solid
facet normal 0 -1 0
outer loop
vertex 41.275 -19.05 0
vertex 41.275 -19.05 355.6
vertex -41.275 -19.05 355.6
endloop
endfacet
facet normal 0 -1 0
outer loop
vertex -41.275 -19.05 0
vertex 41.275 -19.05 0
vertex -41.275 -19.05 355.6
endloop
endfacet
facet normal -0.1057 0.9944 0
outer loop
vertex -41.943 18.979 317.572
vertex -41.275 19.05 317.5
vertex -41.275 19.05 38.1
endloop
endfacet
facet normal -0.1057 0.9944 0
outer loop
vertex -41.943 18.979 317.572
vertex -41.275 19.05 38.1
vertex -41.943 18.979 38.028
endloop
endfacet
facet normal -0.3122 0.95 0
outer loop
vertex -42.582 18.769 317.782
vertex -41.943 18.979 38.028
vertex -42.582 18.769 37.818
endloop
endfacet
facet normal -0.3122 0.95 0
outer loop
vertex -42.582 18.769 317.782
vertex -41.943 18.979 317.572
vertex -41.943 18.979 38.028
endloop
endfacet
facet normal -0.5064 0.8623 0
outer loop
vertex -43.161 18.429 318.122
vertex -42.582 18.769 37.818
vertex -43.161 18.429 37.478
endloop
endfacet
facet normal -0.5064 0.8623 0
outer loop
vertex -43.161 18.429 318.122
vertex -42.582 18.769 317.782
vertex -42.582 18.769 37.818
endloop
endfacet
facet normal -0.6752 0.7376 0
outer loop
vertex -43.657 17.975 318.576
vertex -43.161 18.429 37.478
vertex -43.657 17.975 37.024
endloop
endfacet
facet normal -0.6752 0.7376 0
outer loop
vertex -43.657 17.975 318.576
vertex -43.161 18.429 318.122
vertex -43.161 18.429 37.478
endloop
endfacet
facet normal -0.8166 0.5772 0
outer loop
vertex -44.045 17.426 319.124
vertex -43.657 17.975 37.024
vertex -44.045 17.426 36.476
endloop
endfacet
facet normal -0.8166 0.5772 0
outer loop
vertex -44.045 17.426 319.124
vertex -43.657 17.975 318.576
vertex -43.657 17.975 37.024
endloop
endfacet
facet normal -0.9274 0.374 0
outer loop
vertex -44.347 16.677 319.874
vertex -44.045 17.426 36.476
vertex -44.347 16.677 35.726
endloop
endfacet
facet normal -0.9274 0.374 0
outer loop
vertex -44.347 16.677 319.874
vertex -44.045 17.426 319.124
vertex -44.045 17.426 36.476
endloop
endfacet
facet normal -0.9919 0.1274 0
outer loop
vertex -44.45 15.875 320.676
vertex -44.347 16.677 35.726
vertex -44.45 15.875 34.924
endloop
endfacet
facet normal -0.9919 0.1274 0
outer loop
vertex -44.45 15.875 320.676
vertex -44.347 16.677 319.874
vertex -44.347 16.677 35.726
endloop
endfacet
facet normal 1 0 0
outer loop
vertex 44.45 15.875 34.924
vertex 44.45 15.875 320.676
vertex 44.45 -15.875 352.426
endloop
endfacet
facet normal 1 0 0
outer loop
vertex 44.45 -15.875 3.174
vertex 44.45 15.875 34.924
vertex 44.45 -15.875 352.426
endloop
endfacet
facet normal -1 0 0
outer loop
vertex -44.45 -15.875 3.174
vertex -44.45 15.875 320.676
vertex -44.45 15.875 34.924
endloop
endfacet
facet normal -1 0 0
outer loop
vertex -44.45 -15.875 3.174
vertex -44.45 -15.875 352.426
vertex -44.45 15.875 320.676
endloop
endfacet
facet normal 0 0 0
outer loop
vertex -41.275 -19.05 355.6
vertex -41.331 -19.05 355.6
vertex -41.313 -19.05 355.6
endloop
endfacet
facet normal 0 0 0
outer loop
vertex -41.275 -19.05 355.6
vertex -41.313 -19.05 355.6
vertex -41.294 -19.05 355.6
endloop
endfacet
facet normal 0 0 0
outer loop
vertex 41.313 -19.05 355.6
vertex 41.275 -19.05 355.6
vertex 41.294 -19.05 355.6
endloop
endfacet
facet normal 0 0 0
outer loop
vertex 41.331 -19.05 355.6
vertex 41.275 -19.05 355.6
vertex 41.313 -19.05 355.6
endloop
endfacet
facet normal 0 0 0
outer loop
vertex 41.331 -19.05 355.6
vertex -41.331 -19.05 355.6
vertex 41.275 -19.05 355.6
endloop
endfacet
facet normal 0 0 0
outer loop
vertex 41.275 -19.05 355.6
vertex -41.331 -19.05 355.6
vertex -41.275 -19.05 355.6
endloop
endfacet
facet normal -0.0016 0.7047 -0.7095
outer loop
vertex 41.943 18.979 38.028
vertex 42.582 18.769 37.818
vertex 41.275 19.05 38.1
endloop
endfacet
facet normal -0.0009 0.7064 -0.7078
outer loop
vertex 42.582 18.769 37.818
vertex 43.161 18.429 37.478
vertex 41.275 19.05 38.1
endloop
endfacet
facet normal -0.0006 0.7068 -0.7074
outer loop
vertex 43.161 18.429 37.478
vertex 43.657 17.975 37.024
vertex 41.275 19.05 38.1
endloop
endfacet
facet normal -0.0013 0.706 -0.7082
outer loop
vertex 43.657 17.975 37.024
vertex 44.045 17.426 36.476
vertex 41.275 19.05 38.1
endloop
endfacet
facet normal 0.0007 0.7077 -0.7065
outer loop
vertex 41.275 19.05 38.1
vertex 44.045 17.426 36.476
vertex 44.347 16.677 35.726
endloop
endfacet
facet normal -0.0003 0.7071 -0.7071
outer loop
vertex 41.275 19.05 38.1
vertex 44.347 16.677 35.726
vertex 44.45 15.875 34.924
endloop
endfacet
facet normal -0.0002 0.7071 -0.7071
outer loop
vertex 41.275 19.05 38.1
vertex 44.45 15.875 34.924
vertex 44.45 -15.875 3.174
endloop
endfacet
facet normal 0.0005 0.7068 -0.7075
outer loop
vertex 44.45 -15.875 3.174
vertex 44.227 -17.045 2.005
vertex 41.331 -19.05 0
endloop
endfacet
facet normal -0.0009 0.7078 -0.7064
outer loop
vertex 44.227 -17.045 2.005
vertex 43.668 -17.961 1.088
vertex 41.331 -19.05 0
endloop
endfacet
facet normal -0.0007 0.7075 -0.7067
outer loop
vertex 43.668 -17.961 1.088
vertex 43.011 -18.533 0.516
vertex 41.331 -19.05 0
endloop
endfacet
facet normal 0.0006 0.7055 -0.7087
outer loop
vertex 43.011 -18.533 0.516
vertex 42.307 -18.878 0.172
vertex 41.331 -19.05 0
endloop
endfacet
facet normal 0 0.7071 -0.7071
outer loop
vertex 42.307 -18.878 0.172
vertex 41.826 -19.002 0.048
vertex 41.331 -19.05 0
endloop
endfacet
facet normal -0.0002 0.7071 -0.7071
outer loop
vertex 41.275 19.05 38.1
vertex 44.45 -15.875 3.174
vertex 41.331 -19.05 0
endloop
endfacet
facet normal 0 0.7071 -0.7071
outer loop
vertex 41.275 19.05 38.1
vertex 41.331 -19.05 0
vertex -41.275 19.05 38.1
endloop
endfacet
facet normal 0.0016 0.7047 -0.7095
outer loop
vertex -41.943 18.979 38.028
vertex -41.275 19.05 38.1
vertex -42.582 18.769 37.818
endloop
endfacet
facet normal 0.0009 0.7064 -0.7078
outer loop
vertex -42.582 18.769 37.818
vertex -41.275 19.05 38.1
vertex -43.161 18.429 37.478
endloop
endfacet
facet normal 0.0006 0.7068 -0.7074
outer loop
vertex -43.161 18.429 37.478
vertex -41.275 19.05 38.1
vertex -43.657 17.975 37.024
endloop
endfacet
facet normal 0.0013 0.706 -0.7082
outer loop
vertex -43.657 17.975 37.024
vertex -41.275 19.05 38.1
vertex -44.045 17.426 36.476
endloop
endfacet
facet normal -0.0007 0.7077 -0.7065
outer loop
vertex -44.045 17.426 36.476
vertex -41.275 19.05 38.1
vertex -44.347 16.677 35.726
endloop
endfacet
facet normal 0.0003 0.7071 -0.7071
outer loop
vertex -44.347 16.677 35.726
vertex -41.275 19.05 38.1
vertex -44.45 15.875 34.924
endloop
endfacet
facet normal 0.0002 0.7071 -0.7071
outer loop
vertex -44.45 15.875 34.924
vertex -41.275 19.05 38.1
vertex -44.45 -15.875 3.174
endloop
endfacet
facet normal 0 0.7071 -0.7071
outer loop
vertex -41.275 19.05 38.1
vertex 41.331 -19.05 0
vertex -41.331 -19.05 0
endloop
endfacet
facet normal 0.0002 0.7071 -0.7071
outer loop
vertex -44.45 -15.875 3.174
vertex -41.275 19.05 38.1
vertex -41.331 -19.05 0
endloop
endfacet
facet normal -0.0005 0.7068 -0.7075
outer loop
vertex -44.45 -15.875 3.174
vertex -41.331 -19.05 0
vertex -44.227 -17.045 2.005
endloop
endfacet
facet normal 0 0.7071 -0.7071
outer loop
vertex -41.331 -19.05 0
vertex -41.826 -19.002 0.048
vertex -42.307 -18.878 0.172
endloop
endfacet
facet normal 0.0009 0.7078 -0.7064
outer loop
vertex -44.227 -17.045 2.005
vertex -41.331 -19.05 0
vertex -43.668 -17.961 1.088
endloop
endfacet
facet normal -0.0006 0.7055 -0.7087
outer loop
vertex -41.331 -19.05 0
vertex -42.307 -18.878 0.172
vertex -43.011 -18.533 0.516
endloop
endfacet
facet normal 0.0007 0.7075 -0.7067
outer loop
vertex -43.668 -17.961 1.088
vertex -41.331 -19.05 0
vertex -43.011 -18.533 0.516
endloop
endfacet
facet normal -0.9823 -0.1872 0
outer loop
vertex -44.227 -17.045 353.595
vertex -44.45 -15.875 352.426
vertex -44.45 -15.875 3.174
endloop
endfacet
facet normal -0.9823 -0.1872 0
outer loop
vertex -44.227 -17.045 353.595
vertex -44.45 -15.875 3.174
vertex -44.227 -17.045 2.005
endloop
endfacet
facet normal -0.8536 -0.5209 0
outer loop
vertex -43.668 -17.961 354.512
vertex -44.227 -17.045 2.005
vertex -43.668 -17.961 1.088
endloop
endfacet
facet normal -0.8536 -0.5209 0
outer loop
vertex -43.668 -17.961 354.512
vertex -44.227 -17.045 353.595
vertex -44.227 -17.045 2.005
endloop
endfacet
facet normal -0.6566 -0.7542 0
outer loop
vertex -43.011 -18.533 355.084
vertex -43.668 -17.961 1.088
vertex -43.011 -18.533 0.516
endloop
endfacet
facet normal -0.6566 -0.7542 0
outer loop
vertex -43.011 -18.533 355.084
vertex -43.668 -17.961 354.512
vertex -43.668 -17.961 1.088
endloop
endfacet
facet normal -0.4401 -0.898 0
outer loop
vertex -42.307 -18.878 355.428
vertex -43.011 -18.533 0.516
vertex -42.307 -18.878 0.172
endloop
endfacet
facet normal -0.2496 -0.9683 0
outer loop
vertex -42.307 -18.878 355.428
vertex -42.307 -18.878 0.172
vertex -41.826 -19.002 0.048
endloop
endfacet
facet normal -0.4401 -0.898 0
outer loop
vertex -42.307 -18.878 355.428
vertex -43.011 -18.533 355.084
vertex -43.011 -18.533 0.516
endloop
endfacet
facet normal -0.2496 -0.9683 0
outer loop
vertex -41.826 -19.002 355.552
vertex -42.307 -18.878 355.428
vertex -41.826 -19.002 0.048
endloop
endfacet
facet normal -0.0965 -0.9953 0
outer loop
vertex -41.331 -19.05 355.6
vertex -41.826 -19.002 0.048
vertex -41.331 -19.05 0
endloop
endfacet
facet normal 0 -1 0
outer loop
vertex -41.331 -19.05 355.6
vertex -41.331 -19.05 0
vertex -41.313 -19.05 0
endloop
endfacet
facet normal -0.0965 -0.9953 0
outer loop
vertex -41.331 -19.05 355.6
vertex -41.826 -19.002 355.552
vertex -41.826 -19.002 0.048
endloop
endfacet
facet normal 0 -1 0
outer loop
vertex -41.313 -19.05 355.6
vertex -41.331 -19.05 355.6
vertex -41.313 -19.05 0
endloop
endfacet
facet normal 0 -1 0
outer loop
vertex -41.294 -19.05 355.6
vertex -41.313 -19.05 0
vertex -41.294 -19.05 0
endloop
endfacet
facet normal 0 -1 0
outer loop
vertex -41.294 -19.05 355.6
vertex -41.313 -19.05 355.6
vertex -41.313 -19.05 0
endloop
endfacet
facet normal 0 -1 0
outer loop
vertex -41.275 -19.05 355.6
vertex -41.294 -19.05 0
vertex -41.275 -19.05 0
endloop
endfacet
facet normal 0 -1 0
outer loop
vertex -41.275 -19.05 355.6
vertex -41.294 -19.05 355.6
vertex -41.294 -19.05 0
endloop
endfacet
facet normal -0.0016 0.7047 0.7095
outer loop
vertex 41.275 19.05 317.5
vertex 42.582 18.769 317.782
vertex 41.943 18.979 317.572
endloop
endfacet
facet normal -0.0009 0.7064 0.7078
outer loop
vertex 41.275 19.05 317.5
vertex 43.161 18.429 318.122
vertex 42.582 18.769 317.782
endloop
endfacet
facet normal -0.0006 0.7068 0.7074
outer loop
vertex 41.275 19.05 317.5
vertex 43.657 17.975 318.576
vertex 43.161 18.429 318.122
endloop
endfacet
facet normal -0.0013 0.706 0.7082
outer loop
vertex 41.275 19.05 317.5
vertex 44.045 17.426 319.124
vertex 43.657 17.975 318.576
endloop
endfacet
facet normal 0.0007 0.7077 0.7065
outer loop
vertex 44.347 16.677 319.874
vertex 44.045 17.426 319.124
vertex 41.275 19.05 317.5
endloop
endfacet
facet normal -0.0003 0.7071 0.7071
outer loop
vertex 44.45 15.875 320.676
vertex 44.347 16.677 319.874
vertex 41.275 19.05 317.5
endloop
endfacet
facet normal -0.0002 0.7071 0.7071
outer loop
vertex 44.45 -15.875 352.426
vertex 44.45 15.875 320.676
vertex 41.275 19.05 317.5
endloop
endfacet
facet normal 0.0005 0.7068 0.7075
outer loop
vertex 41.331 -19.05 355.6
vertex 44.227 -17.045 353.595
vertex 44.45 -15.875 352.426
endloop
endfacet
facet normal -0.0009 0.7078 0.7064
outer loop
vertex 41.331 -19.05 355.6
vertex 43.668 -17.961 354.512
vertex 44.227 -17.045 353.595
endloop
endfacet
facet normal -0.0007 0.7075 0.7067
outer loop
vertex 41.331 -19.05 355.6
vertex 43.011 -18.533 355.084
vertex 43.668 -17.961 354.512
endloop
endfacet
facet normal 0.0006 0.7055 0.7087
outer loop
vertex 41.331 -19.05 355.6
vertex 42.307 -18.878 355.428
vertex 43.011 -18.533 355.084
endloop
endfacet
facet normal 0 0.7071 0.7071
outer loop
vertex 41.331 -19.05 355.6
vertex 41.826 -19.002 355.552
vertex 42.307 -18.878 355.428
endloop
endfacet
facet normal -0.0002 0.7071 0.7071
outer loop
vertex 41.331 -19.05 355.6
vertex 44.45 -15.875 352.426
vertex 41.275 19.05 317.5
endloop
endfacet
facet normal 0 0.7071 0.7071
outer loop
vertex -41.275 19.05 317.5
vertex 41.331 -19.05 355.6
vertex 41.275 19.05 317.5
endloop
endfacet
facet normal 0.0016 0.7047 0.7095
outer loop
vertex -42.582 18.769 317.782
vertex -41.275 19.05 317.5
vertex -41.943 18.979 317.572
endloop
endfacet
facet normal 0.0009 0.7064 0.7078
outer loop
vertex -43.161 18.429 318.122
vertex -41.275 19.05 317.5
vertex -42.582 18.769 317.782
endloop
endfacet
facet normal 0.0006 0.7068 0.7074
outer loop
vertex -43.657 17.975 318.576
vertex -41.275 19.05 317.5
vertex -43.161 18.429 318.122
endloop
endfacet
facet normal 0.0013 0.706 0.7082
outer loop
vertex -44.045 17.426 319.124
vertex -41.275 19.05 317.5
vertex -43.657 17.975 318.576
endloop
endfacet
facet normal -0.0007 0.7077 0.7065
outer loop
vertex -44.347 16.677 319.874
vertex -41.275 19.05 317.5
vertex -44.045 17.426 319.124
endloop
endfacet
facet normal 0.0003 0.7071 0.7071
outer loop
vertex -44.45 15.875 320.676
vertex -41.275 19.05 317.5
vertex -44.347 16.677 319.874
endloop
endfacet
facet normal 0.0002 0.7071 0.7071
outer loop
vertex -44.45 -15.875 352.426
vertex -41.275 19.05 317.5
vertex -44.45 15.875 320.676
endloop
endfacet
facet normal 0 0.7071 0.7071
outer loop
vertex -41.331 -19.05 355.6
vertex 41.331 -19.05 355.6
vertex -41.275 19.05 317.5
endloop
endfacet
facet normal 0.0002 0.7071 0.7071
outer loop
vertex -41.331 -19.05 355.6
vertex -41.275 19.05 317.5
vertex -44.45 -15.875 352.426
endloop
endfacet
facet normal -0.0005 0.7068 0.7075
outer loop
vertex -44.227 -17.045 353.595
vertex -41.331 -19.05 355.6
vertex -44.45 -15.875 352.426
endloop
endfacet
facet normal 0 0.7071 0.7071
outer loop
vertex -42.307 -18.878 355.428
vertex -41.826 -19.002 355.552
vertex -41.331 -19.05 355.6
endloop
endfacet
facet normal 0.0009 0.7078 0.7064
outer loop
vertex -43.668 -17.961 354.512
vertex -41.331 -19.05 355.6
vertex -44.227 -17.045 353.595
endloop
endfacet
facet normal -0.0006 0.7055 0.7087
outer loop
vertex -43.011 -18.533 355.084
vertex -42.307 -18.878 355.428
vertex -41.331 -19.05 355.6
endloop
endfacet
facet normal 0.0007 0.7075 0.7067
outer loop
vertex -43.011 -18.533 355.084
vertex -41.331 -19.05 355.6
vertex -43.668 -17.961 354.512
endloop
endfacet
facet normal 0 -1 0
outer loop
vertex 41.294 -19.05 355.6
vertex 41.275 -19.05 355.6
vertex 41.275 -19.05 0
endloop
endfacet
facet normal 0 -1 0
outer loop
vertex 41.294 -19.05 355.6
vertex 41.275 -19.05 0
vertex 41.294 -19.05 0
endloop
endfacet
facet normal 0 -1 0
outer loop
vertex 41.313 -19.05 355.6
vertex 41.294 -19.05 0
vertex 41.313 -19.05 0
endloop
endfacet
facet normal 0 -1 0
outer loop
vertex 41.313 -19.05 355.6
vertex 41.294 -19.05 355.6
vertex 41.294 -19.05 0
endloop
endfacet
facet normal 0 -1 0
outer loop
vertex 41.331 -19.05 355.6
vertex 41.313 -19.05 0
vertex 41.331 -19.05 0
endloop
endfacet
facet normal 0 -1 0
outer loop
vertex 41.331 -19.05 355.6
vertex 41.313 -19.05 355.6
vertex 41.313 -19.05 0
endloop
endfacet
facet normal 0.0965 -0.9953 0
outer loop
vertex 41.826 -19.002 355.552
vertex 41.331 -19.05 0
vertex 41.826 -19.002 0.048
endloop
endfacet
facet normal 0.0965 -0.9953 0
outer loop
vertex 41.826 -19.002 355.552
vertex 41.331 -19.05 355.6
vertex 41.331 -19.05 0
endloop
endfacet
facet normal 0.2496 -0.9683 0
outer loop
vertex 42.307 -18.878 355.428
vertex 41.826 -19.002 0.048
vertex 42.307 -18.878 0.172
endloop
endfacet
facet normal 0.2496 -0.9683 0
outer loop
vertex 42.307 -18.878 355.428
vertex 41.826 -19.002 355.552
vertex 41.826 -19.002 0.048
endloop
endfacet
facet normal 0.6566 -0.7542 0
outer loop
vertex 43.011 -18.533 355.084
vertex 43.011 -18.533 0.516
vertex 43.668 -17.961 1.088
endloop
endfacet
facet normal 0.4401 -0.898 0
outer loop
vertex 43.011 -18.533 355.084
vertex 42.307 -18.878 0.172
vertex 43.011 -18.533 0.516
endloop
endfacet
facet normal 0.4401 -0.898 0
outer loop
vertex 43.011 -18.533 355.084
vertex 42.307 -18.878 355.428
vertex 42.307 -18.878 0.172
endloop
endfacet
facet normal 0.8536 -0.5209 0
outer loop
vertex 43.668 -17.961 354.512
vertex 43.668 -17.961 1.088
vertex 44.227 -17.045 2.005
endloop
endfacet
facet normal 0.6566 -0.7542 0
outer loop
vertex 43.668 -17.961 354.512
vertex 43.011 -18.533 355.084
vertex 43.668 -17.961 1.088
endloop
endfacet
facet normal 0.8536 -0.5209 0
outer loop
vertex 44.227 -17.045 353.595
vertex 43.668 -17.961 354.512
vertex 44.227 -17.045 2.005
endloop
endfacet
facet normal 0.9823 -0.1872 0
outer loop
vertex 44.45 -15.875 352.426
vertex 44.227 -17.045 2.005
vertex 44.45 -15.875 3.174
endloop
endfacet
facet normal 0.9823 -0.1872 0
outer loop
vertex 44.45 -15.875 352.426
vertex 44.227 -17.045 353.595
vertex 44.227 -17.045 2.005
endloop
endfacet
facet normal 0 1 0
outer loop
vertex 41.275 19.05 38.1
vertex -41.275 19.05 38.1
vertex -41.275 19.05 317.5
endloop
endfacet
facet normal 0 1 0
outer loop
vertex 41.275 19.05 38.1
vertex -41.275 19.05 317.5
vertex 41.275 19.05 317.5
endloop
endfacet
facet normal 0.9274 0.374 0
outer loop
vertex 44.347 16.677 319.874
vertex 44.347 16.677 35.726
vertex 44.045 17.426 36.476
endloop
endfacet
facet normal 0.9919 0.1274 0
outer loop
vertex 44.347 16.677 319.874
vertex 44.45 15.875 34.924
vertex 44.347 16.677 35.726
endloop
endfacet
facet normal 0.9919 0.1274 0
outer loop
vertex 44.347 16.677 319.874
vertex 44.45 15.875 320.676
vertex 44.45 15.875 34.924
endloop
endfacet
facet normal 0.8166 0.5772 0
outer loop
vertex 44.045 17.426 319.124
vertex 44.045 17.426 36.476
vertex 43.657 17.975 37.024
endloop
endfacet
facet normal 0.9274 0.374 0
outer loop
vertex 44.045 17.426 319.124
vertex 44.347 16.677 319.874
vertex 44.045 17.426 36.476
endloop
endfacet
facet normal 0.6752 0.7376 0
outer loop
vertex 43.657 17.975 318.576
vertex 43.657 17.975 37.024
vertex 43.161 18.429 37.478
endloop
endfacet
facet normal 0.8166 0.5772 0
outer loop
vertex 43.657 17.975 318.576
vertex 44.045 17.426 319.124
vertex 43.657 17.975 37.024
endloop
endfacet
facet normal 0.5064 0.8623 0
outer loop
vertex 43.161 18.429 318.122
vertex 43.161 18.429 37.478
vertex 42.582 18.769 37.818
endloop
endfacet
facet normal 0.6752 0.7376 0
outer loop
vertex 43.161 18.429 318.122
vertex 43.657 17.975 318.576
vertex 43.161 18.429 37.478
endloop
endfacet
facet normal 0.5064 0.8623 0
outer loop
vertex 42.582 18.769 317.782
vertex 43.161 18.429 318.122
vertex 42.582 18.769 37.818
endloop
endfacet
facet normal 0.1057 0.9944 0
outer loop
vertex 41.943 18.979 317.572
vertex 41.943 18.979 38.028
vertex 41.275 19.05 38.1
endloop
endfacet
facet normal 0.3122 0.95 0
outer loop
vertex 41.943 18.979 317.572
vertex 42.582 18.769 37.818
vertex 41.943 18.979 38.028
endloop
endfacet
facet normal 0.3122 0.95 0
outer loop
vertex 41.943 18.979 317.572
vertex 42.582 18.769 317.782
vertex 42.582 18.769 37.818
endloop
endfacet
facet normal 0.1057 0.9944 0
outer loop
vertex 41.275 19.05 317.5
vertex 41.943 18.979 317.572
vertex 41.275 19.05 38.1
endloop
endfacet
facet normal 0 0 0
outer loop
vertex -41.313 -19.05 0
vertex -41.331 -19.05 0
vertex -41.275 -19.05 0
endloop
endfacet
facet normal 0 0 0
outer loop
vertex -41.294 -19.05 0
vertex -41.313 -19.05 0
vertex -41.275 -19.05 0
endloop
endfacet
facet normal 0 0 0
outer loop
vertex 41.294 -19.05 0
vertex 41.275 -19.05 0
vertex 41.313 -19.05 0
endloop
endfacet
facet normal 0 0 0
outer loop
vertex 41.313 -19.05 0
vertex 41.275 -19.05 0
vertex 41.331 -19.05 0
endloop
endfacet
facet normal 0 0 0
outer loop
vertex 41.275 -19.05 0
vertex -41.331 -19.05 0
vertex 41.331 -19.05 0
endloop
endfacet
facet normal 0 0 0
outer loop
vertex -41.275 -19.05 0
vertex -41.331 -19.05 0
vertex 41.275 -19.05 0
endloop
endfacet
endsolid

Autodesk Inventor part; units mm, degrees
ref_plane "YZ Plane" through (0, 0, 0) normal (1, 0, 0) x (0, 1, 0)
ref_plane "XZ Plane" through (0, 0, 0) normal (0, 1, 0) x (-1, 0, 0)
ref_plane "XY Plane" through (0, 0, 0) normal (0, 0, 1) x (1, 0, 0)
sketch "Sketch1" plane through (0, 0, 0) normal (0, 0, 1) x (1, 0, 0)
  line L0 (-44.45, 19.05) -> (44.45, 19.05)
  line L1 (44.45, 19.05) -> (44.45, -19.05)
  line L2 (44.45, -19.05) -> (-44.45, -19.05)
  line L3 (-44.45, -19.05) -> (-44.45, 19.05)
  line L4 (-44.45, 19.05) -> (44.45, -19.05) construction
  line L5 (44.45, 19.05) -> (-44.45, -19.05) construction
  point P0 (0, 0)
  dimension "d0" = 88.9
  dimension "d1" = 38.1
extrude "Extrusion1" add sketch "Sketch1" along normal blind 355.6
chamfer "Chamfer1" distance 38.1 angle 45 2 edges at (0, 19.05, 355.6) (0, 19.05, 0)
fillet "Fillet1" radius 3.175 4 edges at (-44.45, 19.05, 177.8) (-44.45, -19.05, 177.8) (44.45, -19.05, 177.8) (44.45, 19.05, 177.8)
properties part number "Upper Decoration"
